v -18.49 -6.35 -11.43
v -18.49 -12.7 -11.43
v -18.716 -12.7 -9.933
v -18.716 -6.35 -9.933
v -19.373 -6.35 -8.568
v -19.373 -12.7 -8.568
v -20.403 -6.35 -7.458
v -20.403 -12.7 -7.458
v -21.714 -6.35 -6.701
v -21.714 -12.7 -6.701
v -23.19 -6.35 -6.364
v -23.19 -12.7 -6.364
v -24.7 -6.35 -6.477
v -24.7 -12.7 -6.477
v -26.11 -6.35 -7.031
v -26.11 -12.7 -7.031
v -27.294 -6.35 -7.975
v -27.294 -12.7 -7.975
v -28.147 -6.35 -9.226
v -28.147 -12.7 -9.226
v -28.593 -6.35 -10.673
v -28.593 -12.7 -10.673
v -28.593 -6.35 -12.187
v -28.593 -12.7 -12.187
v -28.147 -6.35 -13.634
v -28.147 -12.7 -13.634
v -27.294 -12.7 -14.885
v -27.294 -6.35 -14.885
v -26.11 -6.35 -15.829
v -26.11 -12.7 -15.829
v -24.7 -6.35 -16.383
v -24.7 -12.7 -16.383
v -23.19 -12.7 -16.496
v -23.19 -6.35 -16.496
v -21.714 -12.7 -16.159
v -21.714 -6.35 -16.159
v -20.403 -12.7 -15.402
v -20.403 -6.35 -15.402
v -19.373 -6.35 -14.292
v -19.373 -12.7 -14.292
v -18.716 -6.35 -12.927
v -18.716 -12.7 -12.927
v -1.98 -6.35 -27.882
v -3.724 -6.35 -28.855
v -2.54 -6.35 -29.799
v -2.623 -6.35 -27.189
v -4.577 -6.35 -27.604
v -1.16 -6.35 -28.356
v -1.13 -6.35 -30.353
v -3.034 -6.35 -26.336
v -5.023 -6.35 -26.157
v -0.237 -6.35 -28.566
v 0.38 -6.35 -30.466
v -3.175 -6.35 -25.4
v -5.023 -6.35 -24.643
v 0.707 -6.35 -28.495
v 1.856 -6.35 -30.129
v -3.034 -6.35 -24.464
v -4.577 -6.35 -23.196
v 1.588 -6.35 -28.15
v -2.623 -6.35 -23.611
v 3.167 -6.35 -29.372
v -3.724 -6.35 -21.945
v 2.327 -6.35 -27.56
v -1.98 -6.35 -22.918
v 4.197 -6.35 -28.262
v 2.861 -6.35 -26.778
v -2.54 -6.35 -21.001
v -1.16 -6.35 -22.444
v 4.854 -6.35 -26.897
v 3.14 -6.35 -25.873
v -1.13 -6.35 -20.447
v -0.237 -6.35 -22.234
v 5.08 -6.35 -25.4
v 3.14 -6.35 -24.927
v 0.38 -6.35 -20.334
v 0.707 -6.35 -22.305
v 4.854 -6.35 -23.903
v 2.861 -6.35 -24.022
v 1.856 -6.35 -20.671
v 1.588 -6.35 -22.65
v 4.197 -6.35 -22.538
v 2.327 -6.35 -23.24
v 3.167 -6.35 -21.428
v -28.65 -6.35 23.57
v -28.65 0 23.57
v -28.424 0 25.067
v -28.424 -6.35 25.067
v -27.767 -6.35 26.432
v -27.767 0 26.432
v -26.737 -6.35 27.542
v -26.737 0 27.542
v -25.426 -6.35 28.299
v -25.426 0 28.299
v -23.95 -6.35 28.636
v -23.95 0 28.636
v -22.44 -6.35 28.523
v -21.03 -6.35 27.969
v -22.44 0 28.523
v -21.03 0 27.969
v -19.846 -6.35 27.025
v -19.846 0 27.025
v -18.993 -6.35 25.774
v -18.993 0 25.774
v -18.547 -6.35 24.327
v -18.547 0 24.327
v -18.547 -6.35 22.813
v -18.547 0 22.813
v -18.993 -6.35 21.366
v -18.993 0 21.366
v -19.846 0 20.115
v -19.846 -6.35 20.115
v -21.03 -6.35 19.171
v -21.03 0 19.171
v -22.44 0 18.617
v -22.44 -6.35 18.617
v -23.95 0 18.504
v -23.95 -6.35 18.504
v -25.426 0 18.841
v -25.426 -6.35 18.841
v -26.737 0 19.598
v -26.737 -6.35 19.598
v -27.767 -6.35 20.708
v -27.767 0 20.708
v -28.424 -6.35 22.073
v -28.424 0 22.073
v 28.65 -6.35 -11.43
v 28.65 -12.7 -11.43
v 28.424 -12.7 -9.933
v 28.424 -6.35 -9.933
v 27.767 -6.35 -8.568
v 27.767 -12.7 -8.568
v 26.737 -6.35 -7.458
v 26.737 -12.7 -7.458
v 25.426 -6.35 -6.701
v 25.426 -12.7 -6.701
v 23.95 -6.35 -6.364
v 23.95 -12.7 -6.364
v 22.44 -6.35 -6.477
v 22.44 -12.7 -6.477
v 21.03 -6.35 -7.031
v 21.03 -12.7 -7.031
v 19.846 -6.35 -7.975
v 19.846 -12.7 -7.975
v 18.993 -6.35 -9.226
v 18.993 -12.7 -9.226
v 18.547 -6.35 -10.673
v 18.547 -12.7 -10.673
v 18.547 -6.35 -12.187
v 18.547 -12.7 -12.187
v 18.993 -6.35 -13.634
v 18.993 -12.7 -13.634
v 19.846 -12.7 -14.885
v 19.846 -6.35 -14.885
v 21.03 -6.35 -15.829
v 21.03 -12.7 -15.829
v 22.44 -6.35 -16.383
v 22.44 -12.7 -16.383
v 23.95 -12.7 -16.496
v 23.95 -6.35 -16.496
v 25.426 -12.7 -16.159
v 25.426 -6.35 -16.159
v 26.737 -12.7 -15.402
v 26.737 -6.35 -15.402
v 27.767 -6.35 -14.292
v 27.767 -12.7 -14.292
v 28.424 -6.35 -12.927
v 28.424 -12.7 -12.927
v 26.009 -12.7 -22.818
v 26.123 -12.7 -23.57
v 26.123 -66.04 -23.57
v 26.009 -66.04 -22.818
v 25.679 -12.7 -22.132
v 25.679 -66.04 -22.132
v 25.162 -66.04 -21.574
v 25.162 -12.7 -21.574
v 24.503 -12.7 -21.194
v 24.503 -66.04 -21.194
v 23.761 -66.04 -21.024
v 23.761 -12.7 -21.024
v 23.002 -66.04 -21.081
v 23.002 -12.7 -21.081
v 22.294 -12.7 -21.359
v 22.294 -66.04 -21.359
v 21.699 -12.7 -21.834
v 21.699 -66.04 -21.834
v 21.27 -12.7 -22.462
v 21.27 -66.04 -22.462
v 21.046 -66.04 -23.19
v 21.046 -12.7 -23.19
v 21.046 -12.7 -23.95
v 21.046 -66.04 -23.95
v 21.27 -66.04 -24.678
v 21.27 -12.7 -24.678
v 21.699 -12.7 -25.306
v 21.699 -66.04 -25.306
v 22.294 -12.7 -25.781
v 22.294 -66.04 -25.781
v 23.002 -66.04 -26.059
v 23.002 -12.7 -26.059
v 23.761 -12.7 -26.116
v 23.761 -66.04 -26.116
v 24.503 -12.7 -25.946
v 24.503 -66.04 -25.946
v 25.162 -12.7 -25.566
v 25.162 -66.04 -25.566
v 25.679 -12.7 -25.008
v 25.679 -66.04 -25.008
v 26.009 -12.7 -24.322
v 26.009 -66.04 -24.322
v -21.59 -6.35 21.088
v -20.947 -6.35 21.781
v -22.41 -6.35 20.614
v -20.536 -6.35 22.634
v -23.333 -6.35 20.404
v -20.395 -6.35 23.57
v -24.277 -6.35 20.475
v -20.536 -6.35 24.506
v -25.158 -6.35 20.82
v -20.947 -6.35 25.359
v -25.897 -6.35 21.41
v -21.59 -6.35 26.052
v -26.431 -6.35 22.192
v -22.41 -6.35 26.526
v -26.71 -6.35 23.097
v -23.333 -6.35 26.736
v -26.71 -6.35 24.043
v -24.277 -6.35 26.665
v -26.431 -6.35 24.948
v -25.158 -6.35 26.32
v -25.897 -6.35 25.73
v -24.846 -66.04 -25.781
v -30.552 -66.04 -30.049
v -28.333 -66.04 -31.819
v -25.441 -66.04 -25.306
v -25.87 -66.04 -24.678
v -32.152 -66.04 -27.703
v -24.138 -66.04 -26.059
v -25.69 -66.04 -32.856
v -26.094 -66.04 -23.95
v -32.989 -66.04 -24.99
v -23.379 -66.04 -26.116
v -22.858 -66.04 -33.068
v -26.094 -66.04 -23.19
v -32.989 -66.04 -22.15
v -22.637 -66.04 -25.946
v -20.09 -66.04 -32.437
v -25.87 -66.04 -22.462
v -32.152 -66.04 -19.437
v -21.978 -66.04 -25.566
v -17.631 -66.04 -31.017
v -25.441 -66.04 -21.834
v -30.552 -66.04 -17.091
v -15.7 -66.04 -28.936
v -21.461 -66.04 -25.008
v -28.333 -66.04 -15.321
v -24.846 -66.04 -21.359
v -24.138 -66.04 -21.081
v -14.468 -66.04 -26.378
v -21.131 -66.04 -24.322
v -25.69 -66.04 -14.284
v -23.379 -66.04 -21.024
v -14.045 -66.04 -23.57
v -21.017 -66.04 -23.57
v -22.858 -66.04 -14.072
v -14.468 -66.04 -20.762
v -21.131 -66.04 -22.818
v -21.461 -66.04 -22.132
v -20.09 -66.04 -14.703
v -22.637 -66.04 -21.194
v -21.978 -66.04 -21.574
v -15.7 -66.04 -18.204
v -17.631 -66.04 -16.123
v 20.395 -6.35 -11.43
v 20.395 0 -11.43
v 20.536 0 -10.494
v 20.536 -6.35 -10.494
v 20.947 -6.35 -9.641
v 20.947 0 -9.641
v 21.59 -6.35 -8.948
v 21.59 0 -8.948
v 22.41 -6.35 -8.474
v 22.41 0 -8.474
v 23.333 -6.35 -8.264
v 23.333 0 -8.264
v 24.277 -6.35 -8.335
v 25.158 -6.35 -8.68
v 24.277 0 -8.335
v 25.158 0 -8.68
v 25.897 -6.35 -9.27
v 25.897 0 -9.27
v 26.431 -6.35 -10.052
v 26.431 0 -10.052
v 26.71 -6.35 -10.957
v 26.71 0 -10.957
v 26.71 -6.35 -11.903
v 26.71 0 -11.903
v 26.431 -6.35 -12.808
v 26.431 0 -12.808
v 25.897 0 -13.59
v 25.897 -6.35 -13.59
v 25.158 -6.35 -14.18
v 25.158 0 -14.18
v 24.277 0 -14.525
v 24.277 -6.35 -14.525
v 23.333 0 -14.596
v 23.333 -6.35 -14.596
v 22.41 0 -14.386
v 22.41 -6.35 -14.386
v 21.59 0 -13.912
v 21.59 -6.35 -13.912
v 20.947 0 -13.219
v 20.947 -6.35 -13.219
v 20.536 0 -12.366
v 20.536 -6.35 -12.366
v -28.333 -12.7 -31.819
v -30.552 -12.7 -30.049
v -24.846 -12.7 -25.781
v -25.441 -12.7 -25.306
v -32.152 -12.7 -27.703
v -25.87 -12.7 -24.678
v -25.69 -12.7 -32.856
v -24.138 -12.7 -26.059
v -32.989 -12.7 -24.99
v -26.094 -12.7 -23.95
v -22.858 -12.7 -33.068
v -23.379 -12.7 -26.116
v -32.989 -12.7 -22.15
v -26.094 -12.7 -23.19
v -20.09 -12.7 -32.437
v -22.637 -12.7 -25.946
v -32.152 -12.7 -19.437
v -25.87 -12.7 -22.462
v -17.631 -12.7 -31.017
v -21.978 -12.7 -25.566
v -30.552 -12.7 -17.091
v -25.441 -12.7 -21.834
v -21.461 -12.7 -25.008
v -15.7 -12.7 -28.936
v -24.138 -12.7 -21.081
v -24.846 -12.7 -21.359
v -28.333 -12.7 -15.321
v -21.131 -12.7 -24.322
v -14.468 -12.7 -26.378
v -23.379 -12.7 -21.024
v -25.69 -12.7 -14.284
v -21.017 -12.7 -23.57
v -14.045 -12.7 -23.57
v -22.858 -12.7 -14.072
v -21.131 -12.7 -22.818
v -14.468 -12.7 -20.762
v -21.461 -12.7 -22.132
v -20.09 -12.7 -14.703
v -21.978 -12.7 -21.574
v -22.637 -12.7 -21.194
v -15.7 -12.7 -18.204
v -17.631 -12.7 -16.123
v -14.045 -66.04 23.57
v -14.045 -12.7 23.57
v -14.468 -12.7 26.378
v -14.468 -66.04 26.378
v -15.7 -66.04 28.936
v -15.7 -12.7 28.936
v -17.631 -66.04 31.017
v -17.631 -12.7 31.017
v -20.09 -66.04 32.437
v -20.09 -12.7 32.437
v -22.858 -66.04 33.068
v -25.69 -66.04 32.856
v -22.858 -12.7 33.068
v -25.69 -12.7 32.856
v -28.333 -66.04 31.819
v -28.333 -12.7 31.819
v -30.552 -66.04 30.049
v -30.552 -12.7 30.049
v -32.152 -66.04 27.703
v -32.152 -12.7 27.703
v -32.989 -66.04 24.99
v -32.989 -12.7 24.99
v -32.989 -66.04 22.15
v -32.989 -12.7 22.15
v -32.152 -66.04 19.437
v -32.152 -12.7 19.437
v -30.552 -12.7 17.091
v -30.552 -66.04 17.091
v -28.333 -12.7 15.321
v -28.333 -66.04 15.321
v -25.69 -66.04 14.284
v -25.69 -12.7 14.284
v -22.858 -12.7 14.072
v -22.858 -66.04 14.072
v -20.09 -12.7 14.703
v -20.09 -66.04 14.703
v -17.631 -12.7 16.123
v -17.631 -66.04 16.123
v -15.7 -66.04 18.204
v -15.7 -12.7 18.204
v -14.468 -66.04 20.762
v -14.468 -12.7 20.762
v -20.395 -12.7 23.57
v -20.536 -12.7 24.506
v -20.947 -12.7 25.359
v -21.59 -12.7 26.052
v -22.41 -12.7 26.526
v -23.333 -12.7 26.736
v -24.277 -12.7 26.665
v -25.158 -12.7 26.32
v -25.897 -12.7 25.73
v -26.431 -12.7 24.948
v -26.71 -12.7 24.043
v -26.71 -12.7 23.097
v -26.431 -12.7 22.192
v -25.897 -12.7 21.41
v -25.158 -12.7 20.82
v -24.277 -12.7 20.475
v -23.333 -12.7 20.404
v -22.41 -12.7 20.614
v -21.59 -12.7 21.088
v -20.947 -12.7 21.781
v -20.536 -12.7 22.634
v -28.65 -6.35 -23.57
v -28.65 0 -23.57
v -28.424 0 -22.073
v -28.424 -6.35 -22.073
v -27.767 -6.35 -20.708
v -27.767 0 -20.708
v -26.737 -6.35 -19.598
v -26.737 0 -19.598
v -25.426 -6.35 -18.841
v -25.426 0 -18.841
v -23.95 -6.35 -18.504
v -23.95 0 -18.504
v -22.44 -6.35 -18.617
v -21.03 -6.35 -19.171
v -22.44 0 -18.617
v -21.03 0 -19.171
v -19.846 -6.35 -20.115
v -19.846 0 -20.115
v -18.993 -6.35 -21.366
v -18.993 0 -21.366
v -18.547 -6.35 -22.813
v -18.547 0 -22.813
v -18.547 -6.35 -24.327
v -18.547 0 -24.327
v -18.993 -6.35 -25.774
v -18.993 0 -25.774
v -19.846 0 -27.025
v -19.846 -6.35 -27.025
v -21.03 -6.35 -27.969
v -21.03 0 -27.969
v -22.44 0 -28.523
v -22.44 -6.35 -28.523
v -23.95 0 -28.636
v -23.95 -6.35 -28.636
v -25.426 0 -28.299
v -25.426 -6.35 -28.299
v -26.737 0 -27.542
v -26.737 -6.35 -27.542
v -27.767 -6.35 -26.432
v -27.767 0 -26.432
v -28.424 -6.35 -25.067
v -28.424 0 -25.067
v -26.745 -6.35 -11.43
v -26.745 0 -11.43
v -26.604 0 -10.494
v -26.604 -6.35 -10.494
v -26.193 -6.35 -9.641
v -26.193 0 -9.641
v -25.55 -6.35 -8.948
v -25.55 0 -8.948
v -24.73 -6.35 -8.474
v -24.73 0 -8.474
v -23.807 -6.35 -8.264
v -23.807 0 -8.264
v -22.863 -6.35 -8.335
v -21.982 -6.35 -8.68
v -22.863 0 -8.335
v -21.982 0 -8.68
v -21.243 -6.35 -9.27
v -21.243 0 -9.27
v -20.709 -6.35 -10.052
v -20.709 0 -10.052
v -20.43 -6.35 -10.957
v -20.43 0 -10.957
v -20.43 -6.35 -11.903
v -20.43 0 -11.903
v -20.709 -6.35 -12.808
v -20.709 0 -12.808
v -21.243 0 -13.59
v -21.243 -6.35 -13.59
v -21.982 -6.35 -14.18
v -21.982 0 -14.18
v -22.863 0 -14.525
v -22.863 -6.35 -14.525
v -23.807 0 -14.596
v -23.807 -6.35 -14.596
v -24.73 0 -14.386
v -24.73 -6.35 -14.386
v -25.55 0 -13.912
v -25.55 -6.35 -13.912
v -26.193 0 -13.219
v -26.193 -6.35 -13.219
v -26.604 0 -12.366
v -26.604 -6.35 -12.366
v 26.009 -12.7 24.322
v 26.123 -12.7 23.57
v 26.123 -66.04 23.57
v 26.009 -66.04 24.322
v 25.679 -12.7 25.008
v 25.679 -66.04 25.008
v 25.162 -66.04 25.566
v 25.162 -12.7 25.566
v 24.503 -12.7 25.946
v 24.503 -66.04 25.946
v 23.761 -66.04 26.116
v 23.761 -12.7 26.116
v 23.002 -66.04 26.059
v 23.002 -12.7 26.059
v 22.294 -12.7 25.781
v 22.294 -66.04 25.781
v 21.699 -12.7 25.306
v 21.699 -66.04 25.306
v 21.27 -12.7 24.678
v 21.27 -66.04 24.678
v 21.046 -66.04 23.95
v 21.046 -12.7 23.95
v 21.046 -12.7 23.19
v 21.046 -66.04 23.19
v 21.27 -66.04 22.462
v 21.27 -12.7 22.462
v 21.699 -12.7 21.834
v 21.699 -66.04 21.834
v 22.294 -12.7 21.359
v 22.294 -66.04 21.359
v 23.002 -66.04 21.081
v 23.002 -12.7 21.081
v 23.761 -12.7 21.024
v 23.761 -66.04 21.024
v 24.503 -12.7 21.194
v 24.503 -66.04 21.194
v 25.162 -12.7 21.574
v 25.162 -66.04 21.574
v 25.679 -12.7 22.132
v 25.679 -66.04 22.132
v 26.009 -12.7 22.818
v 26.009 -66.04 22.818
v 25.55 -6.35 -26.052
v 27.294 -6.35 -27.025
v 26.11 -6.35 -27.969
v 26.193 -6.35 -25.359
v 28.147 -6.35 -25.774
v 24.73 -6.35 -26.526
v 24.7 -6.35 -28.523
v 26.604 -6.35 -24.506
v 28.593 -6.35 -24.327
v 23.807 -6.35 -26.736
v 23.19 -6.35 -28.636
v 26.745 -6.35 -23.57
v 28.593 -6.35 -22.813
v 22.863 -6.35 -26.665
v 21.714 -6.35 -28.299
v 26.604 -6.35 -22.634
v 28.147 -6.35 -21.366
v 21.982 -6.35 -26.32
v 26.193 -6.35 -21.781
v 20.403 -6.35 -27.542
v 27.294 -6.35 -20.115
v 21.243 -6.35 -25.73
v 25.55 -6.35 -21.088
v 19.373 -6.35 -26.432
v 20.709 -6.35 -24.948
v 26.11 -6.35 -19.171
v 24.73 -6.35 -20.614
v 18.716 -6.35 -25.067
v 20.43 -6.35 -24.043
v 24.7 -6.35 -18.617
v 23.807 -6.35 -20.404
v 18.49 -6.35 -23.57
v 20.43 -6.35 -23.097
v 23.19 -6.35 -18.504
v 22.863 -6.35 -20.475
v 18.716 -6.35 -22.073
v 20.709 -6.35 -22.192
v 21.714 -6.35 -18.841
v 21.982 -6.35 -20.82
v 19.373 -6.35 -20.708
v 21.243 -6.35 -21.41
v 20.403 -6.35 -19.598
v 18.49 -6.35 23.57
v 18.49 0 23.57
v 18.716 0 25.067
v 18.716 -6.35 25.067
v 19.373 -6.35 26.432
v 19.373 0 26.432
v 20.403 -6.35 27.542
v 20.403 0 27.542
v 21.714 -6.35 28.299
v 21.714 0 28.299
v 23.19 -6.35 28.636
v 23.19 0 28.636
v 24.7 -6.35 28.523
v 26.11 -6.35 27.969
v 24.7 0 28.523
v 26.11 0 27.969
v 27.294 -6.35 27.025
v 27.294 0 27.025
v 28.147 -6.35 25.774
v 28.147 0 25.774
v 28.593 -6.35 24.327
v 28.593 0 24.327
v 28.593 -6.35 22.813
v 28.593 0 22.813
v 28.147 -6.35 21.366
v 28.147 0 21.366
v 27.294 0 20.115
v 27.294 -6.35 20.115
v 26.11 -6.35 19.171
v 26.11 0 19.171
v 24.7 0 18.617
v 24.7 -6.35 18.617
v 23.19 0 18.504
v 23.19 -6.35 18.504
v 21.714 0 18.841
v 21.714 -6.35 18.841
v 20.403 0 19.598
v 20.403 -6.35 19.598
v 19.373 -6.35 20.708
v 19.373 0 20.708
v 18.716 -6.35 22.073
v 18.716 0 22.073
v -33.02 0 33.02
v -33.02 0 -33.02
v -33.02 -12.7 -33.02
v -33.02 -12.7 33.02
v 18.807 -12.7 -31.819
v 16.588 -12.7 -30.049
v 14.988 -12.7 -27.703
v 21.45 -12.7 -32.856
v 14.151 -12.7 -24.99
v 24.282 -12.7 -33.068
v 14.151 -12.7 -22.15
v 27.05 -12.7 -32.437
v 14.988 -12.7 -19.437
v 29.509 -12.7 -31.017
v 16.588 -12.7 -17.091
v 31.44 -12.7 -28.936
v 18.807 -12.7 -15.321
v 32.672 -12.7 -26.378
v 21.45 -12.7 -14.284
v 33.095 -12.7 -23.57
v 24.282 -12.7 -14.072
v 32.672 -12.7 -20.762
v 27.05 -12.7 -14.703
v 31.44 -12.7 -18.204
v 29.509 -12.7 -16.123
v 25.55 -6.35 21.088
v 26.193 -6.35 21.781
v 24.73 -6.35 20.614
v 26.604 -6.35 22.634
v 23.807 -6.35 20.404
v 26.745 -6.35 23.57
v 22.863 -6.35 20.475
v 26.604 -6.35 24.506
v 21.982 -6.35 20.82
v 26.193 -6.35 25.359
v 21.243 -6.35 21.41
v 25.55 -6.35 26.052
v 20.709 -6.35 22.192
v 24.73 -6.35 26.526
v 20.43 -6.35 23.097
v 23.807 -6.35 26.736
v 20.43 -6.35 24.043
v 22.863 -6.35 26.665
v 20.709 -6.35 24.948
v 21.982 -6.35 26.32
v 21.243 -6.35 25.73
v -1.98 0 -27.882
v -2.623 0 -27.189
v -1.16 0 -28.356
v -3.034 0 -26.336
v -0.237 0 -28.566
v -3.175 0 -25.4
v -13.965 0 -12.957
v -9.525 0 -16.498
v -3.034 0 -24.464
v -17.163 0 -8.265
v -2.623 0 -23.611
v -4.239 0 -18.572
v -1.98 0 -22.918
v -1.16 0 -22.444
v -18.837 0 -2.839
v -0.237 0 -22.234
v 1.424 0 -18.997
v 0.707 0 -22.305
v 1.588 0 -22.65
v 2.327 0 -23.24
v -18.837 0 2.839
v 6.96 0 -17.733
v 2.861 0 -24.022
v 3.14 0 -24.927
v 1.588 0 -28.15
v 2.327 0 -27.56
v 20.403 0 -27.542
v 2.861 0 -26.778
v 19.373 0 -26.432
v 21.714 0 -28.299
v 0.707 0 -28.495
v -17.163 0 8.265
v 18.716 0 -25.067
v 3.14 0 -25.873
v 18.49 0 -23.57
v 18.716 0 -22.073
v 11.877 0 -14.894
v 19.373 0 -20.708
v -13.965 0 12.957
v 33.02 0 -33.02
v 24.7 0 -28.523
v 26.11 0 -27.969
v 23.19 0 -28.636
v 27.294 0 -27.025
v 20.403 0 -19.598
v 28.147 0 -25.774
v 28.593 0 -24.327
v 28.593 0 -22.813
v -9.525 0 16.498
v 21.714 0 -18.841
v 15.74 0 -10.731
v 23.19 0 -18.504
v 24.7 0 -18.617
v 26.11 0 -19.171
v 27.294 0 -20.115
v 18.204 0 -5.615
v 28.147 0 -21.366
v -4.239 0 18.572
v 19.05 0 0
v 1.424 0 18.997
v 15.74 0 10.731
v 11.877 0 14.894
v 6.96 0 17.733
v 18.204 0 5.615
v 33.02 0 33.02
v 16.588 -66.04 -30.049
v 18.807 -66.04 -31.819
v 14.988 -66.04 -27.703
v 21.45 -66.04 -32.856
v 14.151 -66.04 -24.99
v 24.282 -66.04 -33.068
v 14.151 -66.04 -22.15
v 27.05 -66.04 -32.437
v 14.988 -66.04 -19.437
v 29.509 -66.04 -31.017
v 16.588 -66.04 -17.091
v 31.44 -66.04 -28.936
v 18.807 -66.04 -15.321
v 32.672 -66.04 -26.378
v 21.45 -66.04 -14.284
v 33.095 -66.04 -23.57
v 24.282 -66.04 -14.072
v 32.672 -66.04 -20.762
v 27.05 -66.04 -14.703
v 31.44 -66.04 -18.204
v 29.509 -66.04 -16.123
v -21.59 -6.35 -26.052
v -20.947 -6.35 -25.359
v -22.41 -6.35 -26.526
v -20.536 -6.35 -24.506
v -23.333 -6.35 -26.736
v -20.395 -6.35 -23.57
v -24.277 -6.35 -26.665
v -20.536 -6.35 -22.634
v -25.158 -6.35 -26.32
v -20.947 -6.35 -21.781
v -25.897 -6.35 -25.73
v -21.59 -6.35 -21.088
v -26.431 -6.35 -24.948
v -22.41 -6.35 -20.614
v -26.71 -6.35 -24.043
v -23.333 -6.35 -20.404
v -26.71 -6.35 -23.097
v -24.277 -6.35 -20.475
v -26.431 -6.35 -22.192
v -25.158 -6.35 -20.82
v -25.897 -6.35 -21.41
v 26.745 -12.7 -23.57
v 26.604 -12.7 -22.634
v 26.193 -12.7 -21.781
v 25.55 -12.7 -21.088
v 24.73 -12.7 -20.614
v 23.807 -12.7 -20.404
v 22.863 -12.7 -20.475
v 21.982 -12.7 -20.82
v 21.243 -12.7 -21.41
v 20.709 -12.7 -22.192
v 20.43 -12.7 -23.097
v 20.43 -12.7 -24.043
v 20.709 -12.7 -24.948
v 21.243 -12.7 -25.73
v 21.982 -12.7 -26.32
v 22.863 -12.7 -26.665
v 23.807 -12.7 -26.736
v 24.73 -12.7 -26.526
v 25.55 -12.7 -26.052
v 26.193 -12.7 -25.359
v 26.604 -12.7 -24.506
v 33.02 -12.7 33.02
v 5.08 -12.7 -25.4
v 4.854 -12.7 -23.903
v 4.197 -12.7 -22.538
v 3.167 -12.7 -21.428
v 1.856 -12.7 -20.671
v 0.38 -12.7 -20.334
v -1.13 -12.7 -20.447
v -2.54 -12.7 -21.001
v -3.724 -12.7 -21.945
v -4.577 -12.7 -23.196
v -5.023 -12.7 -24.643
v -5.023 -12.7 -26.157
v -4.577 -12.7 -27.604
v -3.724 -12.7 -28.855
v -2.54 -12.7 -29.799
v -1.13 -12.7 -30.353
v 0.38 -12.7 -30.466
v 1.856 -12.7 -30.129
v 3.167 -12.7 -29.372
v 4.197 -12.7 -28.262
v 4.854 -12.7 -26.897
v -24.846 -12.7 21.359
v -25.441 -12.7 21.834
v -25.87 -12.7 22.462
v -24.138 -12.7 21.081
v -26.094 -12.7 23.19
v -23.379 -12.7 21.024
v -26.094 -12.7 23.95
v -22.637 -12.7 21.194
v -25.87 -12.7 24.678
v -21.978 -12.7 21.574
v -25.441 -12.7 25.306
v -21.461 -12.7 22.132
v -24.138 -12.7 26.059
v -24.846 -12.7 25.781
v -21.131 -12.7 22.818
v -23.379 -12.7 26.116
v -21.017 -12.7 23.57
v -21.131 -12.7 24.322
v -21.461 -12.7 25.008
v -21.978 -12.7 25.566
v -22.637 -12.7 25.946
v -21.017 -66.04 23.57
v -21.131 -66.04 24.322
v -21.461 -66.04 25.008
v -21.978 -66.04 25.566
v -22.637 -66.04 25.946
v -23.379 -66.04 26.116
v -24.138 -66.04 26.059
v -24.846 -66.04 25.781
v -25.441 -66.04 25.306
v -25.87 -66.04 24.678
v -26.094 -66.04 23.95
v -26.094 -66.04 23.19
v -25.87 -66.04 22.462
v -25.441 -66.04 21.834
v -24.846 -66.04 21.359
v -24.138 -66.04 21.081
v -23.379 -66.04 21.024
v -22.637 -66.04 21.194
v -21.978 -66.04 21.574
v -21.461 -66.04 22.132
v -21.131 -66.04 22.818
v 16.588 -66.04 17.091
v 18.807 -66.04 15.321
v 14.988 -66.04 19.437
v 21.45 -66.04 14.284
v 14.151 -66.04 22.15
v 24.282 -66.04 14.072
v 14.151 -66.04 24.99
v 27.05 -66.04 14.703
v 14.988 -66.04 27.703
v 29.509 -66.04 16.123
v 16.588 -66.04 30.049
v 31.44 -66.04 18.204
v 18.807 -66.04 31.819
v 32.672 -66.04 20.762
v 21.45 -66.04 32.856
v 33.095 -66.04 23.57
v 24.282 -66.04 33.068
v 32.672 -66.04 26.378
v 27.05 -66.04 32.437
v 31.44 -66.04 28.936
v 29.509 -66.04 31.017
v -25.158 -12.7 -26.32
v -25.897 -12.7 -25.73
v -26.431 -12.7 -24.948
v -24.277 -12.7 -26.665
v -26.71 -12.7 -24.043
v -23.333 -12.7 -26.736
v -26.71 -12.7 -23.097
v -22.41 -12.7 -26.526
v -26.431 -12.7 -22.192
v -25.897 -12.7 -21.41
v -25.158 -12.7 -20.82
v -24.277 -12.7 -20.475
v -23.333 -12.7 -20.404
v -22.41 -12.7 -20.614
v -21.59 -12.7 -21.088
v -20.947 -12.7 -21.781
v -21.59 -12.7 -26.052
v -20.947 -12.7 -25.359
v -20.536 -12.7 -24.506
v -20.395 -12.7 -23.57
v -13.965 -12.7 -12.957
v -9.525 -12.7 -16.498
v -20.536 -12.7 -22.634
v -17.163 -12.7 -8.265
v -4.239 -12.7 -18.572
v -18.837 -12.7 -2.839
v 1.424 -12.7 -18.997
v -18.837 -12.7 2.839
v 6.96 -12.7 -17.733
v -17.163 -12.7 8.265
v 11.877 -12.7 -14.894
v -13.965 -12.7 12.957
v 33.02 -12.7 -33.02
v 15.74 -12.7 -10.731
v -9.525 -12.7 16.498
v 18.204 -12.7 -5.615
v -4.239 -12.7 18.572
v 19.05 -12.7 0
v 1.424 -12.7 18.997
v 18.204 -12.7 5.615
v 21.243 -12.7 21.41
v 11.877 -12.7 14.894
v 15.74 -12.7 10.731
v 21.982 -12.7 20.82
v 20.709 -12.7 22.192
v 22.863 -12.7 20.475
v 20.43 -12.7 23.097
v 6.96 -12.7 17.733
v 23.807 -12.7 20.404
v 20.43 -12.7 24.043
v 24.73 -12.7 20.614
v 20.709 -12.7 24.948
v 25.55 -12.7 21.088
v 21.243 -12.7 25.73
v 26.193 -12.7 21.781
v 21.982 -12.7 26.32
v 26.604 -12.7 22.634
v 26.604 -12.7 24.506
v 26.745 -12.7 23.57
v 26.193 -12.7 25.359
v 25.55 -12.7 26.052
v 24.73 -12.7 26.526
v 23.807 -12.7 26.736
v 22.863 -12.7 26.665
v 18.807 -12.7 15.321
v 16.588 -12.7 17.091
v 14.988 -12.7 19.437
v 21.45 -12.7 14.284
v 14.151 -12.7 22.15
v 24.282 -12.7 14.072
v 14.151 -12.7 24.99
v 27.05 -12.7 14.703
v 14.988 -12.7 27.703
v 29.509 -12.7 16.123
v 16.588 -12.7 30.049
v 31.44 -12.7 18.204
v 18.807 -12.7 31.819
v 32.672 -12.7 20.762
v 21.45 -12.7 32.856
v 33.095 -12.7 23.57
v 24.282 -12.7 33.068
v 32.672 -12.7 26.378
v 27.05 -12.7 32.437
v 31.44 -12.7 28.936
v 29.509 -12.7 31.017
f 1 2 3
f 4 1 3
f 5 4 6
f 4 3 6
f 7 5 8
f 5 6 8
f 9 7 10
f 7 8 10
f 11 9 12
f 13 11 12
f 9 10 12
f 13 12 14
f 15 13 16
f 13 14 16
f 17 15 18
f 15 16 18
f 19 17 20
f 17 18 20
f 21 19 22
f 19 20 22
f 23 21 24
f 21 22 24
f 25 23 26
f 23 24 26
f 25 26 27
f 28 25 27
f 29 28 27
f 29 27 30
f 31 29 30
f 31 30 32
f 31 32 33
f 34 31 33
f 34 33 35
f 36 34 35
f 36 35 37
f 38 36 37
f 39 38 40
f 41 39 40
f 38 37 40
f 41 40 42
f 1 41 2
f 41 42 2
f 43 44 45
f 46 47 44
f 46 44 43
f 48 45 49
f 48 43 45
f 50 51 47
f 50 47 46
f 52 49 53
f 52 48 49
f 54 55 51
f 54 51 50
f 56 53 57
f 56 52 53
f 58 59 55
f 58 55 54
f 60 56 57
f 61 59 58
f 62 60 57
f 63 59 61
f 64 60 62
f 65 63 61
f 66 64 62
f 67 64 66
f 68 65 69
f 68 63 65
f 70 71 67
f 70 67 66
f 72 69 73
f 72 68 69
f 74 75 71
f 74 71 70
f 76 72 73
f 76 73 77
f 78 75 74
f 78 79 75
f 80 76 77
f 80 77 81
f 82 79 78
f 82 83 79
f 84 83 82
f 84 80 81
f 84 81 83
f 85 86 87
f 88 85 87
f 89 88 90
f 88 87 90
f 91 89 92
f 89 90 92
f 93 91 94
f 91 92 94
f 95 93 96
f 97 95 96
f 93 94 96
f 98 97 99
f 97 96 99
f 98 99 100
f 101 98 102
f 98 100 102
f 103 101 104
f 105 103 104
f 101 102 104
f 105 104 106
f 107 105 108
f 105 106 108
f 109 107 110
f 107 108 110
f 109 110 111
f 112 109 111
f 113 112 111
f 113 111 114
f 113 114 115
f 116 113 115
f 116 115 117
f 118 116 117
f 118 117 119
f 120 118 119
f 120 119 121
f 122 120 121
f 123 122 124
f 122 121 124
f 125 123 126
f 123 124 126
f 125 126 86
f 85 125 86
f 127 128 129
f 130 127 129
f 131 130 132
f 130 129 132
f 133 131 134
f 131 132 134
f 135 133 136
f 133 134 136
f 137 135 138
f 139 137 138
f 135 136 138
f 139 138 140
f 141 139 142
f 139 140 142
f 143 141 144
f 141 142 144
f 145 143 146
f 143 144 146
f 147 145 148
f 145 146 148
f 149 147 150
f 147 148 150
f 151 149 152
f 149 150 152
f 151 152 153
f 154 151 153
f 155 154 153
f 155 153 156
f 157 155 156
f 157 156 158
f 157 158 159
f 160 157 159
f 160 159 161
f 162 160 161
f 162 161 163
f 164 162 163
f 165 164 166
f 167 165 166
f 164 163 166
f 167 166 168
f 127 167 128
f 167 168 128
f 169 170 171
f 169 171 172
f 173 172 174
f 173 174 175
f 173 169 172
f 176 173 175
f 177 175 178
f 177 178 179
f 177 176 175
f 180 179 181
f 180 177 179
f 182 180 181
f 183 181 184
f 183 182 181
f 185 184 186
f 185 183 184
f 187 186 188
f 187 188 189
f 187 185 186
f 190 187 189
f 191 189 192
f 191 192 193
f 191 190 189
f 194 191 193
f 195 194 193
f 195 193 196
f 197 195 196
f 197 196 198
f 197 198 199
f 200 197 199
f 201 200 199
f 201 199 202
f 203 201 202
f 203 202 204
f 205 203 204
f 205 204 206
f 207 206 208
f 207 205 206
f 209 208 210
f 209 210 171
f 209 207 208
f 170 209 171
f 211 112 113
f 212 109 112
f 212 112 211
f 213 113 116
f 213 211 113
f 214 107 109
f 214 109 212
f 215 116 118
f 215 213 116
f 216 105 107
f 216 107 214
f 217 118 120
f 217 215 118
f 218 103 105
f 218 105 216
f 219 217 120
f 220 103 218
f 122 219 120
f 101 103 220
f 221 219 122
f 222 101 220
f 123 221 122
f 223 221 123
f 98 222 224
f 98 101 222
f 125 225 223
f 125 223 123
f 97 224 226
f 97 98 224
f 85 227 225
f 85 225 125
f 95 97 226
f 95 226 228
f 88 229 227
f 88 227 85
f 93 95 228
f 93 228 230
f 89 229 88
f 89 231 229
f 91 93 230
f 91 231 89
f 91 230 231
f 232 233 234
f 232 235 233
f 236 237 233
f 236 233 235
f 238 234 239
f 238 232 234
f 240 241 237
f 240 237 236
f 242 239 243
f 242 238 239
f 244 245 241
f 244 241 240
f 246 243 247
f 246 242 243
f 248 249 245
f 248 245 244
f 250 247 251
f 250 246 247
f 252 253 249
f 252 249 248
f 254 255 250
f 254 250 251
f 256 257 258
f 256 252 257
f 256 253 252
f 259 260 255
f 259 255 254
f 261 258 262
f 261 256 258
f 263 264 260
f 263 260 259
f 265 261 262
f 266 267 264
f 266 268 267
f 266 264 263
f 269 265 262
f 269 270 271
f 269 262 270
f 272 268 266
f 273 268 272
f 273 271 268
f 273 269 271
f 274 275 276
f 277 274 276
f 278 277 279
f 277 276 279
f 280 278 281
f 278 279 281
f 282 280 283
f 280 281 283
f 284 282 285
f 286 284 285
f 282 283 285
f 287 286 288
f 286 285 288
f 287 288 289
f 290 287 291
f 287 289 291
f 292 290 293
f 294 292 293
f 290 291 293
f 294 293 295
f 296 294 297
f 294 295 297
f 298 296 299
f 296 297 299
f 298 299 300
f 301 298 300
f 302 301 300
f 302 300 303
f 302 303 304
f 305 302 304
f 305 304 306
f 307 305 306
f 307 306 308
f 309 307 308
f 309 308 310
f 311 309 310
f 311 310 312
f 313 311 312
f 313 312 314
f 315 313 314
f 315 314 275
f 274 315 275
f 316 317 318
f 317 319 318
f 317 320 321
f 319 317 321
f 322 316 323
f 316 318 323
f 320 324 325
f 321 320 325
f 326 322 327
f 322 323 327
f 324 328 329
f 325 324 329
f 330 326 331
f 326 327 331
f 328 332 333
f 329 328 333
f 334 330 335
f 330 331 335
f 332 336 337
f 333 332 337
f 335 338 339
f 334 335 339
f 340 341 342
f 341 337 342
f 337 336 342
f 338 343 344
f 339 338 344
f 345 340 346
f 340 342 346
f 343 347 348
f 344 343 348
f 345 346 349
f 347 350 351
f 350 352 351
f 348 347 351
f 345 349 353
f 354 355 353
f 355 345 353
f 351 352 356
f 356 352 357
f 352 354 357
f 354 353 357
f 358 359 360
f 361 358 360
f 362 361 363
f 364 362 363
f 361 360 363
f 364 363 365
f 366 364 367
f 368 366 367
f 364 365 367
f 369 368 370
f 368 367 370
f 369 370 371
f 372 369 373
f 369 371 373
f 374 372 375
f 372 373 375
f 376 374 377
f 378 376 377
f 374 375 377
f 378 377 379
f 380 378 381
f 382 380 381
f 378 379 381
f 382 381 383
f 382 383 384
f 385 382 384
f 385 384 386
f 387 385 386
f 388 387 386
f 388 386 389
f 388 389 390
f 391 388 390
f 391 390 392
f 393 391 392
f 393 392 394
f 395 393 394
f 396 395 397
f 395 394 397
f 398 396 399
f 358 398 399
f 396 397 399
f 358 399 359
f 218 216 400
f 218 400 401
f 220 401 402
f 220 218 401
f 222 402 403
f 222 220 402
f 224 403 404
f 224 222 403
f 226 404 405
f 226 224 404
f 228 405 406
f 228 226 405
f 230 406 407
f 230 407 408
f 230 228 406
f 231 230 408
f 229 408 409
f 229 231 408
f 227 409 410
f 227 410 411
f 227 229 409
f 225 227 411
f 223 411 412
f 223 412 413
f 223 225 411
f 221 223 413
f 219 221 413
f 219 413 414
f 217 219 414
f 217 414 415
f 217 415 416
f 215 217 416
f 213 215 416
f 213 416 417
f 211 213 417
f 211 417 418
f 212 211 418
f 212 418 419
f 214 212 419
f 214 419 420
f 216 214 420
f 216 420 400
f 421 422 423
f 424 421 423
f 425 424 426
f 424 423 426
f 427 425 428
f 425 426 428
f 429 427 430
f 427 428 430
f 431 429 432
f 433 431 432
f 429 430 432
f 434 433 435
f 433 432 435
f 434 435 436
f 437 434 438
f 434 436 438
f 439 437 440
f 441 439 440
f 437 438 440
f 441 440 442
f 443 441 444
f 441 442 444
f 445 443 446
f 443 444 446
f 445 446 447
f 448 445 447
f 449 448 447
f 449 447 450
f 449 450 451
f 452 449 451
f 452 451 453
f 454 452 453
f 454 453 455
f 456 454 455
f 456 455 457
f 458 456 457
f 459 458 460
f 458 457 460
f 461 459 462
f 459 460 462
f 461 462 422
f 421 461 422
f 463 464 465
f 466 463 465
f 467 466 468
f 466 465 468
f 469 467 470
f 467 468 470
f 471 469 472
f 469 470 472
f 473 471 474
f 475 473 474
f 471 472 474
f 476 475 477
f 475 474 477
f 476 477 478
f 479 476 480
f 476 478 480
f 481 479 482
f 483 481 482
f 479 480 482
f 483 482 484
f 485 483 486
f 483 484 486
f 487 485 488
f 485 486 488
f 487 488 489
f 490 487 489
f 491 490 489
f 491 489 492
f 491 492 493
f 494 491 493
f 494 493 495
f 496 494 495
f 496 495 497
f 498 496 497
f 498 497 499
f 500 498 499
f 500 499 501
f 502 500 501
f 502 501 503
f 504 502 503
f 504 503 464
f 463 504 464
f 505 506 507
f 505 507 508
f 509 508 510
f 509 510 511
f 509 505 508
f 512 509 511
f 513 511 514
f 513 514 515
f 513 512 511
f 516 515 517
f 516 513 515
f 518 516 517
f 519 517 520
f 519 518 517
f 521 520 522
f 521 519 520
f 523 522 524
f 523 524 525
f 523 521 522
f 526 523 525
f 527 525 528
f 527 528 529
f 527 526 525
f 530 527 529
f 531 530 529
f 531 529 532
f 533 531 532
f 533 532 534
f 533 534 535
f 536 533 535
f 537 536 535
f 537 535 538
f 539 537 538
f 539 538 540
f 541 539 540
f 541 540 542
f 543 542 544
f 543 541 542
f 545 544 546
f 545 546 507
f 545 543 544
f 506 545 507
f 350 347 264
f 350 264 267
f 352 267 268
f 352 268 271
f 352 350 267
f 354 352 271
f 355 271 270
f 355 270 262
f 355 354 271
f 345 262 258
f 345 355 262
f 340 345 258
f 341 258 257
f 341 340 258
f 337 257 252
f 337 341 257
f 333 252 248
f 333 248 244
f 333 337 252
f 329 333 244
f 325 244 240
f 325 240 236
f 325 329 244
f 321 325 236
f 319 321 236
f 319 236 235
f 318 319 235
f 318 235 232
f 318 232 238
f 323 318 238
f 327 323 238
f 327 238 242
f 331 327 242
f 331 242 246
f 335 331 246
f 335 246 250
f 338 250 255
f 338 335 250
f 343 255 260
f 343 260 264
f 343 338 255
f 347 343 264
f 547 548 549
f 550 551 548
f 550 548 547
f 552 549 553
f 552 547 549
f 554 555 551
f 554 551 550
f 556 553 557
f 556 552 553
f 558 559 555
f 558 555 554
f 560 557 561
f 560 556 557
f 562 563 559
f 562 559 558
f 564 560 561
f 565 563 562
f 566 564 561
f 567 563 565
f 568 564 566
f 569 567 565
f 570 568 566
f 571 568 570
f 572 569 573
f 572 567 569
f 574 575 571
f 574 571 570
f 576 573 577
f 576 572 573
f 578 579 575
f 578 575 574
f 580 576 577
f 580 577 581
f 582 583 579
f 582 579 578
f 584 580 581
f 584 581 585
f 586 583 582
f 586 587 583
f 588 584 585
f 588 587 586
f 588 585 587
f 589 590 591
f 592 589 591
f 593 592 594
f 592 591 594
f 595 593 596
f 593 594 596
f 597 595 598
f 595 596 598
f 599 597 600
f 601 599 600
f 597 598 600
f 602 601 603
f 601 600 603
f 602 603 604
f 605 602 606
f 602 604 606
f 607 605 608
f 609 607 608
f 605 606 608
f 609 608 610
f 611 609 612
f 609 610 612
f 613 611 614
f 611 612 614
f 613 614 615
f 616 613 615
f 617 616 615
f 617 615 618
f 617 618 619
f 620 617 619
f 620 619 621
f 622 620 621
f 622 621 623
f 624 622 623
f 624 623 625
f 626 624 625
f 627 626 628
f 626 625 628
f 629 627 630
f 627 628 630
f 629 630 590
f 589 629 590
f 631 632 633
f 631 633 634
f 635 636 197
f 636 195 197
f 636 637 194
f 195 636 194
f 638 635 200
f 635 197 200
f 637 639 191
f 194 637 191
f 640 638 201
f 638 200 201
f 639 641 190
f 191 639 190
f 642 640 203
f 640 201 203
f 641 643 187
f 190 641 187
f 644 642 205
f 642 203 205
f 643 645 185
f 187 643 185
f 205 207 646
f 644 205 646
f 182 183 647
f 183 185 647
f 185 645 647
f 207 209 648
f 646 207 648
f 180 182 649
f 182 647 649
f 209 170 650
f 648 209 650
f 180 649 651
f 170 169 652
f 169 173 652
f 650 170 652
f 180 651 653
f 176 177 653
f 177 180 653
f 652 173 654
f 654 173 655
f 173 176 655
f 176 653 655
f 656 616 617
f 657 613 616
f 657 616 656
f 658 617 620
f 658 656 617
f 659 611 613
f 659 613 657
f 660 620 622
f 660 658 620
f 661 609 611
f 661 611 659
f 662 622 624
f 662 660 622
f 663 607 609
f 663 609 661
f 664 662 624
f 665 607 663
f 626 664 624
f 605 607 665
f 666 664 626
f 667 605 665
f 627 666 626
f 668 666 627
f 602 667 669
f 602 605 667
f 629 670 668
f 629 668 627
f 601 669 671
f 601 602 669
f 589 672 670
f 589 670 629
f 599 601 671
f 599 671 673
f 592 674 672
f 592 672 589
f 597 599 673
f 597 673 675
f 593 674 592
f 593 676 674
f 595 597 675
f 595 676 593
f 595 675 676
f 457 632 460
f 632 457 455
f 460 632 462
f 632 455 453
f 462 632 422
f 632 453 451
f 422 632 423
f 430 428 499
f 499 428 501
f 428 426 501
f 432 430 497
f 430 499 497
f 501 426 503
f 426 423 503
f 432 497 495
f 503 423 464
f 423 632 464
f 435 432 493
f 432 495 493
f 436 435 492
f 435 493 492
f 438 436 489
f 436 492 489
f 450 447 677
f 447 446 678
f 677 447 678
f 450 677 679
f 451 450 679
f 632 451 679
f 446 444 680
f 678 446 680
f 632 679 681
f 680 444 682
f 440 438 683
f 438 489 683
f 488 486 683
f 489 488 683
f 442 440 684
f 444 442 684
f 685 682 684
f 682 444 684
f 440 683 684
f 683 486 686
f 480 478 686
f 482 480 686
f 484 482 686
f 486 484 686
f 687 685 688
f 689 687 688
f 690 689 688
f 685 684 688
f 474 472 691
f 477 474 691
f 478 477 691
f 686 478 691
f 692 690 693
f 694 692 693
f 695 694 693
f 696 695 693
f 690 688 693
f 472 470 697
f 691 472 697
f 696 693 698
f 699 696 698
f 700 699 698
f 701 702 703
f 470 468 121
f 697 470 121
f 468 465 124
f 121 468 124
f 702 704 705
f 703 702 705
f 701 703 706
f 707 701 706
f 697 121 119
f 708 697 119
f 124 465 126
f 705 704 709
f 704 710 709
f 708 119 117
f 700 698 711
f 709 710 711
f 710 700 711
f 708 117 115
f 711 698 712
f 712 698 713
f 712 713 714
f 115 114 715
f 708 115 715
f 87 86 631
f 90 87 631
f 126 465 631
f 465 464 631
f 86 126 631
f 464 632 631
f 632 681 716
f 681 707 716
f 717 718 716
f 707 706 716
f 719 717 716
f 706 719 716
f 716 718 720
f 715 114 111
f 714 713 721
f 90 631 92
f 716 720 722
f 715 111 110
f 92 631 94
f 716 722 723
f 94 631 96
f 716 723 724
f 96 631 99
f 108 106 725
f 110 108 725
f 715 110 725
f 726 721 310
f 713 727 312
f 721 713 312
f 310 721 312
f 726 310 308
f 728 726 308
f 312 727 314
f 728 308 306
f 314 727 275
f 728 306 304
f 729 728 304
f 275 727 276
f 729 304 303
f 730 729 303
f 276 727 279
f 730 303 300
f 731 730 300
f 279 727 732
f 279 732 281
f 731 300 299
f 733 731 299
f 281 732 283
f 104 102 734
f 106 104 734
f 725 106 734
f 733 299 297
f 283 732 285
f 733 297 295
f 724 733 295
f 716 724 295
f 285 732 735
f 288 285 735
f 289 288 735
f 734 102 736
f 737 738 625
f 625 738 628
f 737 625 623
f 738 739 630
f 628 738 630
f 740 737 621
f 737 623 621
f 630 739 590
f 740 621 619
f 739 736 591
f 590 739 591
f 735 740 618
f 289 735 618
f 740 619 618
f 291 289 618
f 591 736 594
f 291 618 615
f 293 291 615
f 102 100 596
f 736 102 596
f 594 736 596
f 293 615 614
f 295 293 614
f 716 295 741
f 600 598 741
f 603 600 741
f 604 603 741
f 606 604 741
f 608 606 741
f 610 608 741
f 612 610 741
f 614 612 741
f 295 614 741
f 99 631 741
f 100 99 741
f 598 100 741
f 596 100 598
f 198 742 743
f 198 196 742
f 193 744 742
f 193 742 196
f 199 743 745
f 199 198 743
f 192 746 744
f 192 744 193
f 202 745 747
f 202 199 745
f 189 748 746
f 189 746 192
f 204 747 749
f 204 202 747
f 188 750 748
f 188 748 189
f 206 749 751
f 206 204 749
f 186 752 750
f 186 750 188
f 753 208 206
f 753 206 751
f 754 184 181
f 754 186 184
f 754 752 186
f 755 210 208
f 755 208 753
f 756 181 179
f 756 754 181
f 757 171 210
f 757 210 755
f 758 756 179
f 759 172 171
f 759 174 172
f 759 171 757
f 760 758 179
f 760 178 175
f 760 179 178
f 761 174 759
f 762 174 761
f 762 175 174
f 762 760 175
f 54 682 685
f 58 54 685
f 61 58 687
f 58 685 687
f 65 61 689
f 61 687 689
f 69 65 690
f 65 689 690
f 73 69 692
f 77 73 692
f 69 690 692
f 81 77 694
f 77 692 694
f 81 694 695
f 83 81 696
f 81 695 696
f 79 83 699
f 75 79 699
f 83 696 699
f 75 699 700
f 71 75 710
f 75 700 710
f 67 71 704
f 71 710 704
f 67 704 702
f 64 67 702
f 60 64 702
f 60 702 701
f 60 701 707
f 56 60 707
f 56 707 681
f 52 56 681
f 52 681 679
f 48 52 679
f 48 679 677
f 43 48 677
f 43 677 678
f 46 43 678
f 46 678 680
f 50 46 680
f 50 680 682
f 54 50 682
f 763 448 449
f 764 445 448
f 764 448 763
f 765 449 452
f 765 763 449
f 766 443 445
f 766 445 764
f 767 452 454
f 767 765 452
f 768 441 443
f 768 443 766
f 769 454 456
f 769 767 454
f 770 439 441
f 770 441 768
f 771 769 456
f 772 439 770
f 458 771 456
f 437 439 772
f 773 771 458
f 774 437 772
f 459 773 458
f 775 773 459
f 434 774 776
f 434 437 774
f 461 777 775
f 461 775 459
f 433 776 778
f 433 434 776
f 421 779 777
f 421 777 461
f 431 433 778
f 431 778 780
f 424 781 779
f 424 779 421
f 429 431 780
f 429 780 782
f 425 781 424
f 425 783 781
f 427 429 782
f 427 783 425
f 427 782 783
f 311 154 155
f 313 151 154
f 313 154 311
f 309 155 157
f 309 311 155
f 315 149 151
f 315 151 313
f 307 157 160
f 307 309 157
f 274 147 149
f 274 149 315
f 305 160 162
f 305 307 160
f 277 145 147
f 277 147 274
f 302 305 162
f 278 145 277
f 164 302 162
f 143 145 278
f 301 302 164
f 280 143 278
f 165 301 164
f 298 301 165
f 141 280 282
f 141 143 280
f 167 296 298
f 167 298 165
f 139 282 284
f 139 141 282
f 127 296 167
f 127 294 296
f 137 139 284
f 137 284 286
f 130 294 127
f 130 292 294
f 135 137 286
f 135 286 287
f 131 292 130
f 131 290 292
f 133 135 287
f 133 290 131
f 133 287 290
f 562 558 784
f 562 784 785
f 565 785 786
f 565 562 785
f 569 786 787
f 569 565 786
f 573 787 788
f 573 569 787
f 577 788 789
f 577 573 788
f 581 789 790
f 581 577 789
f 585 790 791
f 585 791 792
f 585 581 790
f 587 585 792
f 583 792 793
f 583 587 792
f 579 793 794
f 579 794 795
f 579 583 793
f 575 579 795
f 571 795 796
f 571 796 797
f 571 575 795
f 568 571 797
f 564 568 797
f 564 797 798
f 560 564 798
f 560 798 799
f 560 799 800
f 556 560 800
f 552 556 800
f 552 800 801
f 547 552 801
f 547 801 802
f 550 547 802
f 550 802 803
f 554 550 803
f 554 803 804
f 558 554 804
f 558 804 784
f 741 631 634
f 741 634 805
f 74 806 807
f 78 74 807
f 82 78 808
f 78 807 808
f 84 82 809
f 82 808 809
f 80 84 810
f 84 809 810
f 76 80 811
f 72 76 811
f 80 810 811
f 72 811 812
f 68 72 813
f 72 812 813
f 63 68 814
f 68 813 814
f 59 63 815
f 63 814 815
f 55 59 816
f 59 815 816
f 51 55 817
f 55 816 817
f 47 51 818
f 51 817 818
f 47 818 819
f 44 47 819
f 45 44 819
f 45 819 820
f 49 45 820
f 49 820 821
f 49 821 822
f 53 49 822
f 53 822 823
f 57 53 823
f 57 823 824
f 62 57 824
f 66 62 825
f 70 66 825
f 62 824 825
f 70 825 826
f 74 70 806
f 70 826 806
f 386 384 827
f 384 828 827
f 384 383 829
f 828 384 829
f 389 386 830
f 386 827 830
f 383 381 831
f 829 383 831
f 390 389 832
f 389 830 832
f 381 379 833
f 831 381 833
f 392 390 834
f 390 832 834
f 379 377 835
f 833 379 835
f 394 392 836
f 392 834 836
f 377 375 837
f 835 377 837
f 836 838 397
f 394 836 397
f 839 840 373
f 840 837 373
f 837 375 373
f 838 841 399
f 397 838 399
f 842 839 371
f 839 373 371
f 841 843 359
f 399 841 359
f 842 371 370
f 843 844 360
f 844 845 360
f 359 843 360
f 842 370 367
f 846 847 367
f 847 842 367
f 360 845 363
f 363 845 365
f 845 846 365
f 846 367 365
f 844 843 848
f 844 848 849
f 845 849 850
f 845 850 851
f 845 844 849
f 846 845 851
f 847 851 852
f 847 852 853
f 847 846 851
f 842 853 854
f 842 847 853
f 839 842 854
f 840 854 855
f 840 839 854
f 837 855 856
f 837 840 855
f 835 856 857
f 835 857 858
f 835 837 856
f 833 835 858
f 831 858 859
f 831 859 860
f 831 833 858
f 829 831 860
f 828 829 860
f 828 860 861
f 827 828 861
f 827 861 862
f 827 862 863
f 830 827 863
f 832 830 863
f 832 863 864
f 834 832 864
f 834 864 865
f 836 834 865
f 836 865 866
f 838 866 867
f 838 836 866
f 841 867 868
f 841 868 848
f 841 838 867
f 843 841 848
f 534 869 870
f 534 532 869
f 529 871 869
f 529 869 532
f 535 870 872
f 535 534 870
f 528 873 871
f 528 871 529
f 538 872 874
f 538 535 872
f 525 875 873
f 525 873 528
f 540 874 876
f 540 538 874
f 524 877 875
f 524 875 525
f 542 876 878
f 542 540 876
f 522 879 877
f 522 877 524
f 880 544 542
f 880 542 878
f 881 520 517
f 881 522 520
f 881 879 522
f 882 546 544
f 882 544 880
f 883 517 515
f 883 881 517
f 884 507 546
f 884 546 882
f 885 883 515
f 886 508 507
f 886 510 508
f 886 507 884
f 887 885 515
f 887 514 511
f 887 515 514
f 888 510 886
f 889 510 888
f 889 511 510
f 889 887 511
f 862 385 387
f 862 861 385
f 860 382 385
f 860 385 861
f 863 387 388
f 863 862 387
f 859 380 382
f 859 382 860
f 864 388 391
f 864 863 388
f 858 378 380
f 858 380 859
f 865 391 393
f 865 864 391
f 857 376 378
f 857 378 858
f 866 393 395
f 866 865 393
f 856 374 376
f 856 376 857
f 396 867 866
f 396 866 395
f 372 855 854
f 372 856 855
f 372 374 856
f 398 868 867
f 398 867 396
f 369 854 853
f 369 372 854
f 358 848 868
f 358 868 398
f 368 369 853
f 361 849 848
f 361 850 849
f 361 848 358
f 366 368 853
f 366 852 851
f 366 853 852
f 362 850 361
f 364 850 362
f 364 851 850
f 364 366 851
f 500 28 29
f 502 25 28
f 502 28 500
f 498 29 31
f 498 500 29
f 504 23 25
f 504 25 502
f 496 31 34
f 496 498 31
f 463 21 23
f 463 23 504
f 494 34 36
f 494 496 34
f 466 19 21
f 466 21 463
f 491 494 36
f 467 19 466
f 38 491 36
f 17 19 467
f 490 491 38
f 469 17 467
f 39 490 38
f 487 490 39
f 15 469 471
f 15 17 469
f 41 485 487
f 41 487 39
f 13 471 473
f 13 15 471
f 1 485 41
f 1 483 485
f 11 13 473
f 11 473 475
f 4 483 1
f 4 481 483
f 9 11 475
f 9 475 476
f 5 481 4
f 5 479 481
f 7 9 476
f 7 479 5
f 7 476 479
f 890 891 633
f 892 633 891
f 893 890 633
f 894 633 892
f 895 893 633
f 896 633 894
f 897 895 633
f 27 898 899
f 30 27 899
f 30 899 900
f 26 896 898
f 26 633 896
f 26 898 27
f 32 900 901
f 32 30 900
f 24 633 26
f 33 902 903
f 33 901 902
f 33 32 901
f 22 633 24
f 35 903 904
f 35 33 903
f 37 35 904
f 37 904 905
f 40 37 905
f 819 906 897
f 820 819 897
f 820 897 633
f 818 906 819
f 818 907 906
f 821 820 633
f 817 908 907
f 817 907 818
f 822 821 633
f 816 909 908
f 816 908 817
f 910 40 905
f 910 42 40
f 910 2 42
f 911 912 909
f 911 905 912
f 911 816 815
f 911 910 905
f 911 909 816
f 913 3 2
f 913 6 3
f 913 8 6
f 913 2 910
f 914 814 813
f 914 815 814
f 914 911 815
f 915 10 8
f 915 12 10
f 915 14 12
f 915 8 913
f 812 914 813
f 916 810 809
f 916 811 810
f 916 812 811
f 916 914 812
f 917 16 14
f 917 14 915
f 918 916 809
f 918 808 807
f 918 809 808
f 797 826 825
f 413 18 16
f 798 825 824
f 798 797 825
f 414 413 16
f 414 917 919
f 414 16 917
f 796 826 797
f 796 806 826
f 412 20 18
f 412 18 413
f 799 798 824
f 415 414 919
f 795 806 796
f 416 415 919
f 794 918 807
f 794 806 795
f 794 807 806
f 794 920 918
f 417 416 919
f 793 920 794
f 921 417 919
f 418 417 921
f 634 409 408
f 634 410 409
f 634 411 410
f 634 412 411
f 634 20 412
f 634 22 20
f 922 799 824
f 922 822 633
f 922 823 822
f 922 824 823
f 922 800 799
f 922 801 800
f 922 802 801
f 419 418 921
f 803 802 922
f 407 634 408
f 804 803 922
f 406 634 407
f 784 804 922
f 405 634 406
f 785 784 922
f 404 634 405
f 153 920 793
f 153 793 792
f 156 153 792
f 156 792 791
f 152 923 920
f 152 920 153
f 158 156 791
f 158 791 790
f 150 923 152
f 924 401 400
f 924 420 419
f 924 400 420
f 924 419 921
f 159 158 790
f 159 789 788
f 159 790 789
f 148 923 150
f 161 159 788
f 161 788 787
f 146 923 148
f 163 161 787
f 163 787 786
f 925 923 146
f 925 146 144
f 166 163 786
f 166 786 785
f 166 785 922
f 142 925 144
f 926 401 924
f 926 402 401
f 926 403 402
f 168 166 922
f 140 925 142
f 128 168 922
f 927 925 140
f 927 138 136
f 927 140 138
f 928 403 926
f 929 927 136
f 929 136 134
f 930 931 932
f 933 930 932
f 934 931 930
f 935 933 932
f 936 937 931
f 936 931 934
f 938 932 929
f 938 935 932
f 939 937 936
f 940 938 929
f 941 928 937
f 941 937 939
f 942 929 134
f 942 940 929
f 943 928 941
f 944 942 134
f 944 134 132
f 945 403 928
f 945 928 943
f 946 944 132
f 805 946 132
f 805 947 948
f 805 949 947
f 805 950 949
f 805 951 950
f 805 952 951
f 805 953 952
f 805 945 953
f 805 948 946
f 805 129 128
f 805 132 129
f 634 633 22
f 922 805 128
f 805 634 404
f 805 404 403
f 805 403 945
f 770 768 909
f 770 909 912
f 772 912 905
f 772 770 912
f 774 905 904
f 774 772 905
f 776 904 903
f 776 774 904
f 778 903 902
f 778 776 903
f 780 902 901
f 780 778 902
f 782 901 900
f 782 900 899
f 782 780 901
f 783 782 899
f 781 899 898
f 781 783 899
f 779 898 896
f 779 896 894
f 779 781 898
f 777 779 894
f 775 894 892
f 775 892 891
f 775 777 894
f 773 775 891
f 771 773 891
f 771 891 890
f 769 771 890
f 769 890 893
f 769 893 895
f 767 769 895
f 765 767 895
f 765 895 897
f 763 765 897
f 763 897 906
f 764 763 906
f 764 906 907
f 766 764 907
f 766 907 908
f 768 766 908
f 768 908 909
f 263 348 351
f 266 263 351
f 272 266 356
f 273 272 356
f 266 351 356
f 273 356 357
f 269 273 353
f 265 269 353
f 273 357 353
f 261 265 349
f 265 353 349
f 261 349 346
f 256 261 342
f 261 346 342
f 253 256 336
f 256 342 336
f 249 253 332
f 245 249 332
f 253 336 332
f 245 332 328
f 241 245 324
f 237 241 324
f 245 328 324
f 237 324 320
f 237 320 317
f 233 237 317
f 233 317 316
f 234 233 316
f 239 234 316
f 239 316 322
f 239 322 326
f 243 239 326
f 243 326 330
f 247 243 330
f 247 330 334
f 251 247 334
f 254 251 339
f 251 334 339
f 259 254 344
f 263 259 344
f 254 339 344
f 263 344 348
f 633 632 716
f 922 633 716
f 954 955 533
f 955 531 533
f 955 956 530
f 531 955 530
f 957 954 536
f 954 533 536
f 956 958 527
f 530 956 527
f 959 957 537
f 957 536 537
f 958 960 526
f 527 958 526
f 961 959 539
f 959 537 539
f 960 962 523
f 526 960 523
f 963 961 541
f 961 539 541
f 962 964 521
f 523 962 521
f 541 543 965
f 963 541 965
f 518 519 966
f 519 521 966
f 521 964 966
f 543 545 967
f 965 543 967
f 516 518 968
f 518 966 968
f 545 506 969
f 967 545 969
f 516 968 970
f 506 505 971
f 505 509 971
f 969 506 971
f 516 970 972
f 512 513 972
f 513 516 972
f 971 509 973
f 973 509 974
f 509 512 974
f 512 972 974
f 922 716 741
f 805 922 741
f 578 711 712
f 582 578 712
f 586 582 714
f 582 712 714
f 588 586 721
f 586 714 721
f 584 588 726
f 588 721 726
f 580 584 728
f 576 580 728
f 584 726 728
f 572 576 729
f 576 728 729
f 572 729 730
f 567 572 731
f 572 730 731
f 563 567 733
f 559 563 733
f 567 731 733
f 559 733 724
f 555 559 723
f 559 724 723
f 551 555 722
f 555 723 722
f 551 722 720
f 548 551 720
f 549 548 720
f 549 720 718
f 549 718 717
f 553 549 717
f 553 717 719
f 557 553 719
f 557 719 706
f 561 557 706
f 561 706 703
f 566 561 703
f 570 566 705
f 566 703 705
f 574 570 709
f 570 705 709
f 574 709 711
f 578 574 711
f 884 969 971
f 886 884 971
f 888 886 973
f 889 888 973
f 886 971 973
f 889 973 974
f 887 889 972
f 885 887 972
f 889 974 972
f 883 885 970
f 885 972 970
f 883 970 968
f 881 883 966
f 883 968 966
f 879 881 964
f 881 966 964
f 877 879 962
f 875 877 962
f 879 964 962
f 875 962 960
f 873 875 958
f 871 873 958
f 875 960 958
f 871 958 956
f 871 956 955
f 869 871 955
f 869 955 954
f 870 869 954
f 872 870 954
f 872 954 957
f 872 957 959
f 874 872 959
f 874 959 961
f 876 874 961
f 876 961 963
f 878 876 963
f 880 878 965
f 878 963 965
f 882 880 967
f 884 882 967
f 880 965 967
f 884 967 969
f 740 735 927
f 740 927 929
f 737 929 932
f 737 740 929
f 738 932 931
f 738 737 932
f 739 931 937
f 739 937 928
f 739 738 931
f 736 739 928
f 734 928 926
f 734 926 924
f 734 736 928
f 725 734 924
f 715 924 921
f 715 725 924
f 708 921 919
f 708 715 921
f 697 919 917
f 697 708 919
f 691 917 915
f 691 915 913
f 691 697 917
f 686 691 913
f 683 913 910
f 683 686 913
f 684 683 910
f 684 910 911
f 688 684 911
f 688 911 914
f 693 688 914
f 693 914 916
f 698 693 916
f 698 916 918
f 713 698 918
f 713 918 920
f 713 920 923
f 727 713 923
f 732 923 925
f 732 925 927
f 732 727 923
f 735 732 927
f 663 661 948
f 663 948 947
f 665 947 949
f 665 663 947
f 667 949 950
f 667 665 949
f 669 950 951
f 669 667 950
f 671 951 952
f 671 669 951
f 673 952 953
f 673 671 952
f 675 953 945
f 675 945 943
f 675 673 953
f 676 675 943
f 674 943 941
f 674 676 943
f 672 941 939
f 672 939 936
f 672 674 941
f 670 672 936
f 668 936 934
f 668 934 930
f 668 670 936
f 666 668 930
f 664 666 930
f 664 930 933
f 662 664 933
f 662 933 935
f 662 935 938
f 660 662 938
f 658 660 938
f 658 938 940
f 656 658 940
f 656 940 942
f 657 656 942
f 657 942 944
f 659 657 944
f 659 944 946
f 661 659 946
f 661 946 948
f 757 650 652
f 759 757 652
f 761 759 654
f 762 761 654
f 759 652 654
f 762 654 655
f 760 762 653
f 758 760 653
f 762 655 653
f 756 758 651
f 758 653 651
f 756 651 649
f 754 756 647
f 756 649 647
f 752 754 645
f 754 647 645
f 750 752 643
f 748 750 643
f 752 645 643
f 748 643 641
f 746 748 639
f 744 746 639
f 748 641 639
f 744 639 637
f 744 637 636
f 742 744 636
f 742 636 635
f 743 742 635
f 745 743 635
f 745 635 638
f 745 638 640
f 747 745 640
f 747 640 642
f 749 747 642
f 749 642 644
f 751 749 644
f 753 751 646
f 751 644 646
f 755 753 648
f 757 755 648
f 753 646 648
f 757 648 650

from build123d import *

# Parameters (mm, degrees)
F0_W     = 66.04
F0_H     = 66.04
F0_R     = 3.175
F0_R_2   = 19.05
F1_DEPTH = 12.7
F2_R     = 5.08
F3_DEPTH = 6.35
F4_R     = 3.175
F5_DEPTH = 12.701
F6_R     = 5.08
F7_DEPTH = 6.35
F8_R     = 9.525
F8_R_2   = 2.5527
F9_DEPTH = 53.34


with BuildPart() as f1:
    # F0 (on Front) → F1 (new body)
    with BuildSketch(Plane.XZ):
        Rectangle(F0_W, F0_H)
        with Locations((-23.57, -23.57)):
            Circle(F0_R, mode=Mode.SUBTRACT)
        with Locations((23.57, -23.57)):
            Circle(F0_R, mode=Mode.SUBTRACT)
        with Locations((-23.57, 23.57)):
            Circle(F0_R, mode=Mode.SUBTRACT)
        Circle(F0_R_2, mode=Mode.SUBTRACT)
        with Locations((23.57, 23.57)):
            Circle(F0_R, mode=Mode.SUBTRACT)
    extrude(amount=F1_DEPTH)

    # F2 (on face) → F3 (cut)
    with BuildSketch(Plane(origin=(0, 0, 0), x_dir=(-1, 0, 0), z_dir=(0, 1, 0))):
        with Locations((23.57, -23.57)):
            Circle(F2_R)
        with Locations((-23.57, -23.57)):
            Circle(F2_R)
        with Locations((-23.57, 23.57)):
            Circle(F2_R)
        with Locations((23.57, 23.57)):
            Circle(F2_R)
    extrude(amount=-F3_DEPTH, mode=Mode.SUBTRACT)

    # F4 (on face) → F5 (cut, through all)
    with BuildSketch(Plane(origin=(0, 0, 0), x_dir=(-1, 0, 0), z_dir=(0, 1, 0))):
        with Locations((23.57, -11.43)):
            Circle(F4_R)
        with Locations((-23.57, -11.43)):
            Circle(F4_R)
        with Locations((0, -25.4)):
            Circle(F4_R)
    extrude(amount=-F5_DEPTH, mode=Mode.SUBTRACT)

    # F6 (on face) → F7 (cut)
    with BuildSketch(Plane.XZ.offset(12.7)):
        with Locations((23.57, -11.43)):
            Circle(F6_R)
        with Locations((0, -25.4)):
            Circle(F6_R)
        with Locations((-23.57, -11.43)):
            Circle(F6_R)
    extrude(amount=-F7_DEPTH, mode=Mode.SUBTRACT)


with BuildPart() as f9:
    # F8 (on face) → F9 (new body)
    with BuildSketch(Plane.XZ.offset(12.7)):
        with Locations((23.57, -23.57)):
            Circle(F8_R)
        with Locations((23.57, -23.57)):
            Circle(F8_R_2, mode=Mode.SUBTRACT)
        with Locations((-23.57, -23.57)):
            Circle(F8_R)
        with Locations((-23.57, -23.57)):
            Circle(F8_R_2, mode=Mode.SUBTRACT)
        with Locations((23.57, 23.57)):
            Circle(F8_R)
        with Locations((23.57, 23.57)):
            Circle(F8_R_2, mode=Mode.SUBTRACT)
        with Locations((-23.57, 23.57)):
            Circle(F8_R)
        with Locations((-23.57, 23.57)):
            Circle(F8_R_2, mode=Mode.SUBTRACT)
    extrude(amount=F9_DEPTH)


solid = Compound([f1.part, f9.part])
